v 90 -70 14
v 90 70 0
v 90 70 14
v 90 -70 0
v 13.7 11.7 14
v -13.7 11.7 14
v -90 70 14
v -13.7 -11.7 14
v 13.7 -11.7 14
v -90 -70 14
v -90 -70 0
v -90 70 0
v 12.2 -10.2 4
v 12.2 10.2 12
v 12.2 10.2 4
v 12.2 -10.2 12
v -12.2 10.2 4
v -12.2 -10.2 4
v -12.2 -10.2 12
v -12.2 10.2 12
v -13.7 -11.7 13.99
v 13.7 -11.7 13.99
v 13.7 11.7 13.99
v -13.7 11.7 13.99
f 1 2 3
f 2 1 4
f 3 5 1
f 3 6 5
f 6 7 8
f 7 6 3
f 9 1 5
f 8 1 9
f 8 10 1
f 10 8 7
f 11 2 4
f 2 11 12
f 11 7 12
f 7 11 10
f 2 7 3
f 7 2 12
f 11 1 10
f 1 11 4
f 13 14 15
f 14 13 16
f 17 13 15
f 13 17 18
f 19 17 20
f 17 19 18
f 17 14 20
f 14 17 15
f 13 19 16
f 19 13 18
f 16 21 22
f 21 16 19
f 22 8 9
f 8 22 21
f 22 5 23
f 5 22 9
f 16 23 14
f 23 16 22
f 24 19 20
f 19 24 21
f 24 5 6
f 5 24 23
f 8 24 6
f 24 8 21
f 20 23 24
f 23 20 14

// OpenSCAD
// Headphone stand: base, post, hanger. Units mm. Print orientation = export orientation (+Z up).
part = "base"; // [base, post, hanger, assembly]
cadverify_only = "";

/* Parameters */
base_L = 180; base_W = 140; base_H = 14;
base_sock_L = 24.4; base_sock_W = 20.4; base_sock_D = 10; // depth from top
base_floor = base_H - base_sock_D; // 4
base_cham_H = 2; base_cham_extra = 1.5; // per side funnel

post_low_L = 24; post_low_W = 20; post_low_H = 10;
post_shaft_L = 34; post_shaft_W = 28; post_shaft_H = 220;
post_up_L = 20; post_up_W = 16; post_up_H = 12;
post_up_cham_H = 1.5; post_up_cham_extra = 1.5; // per side taper at top
post_H = post_low_H + post_shaft_H + post_up_H; // 242

hanger_L = 120; hanger_W = 36; hanger_base_H = 14; hanger_R = 18; // half-cyl radius = W/2
hanger_cyl_H = 18; // peak 14+18=32
lip_L = 10; lip_W = 36; lip_bot = 24; lip_top = 36; // lips 24..36, protrude 4 above peak
hanger_H = 36;
hanger_sock_L = 20.4; hanger_sock_W = 16.4; hanger_sock_D = 12; // straight depth from bottom
hanger_roof_H = 10; // triangular roof above straight, ridge along X
hanger_cham_H = 2; hanger_cham_extra = 1.5;

asm_post_Z = base_floor; // 4, post bottom in assembly
asm_hanger_Z = 234; // hanger bottom in assembly (shaft top)
// checks: shaft top = asm_post_Z+post_low_H+post_shaft_H = 4+10+220=234 ok
// post top = 4+242=246 = hanger straight top (234+12) ok
// hanger top = 234+36=270 ok

module instance(name, part, unit = 1) {
    echo(cadverify_instance = [name, part, unit]);
    if (cadverify_only == "" || cadverify_only == name) children();
}

module base_part() {
    difference() {
        // plate
        translate([-base_L/2, -base_W/2, 0]) cube([base_L, base_W, base_H]);
        // straight socket
        translate([-base_sock_L/2, -base_sock_W/2, base_floor])
            cube([base_sock_L, base_sock_W, base_sock_D+0.01]);
        // entry funnel (frustum): bottom rect sock, top rect enlarged
        hull() {
            translate([-base_sock_L/2, -base_sock_W/2, base_H-base_cham_H])
                cube([base_sock_L, base_sock_W, 0.01]);
            translate([-(base_sock_L/2+base_cham_extra), -(base_sock_W/2+base_cham_extra), base_H-0.01])
                cube([base_sock_L+2*base_cham_extra, base_sock_W+2*base_cham_extra, 0.01]);
        }
    }
}

module post_part() {
    // lower tenon
    translate([-post_low_L/2, -post_low_W/2, 0]) cube([post_low_L, post_low_W, post_low_H]);
    // shaft
    translate([-post_shaft_L/2, -post_shaft_W/2, post_low_H])
        cube([post_shaft_L, post_shaft_W, post_shaft_H]);
    // upper tenon straight
    translate([-post_up_L/2, -post_up_W/2, post_low_H+post_shaft_H])
        cube([post_up_L, post_up_W, post_up_H-post_up_cham_H]);
    // upper tenon top chamfer frustum
    hull() {
        translate([-post_up_L/2, -post_up_W/2, post_low_H+post_shaft_H+post_up_H-post_up_cham_H-0.01])
            cube([post_up_L, post_up_W, 0.01]);
        translate([-(post_up_L/2-post_up_cham_extra), -(post_up_W/2-post_up_cham_extra), post_H-0.01])
            cube([post_up_L-2*post_up_cham_extra, post_up_W-2*post_up_cham_extra, 0.01]);
    }
}

module hanger_part() {
    difference() {
        union() {
            // base box
            translate([-hanger_L/2, -hanger_W/2, 0]) cube([hanger_L, hanger_W, hanger_base_H]);
            // top half-cylinder (only z>=base_H part)
            intersection() {
                translate([0, 0, hanger_base_H]) rotate([0, 90, 0])
                    cylinder(r=hanger_R, h=hanger_L, center=true, $fn=96);
                translate([-hanger_L/2, -hanger_W/2, hanger_base_H]) cube([hanger_L, hanger_W, hanger_cyl_H]);
            }
            // end lips
            for (sx=[-1,1])
                translate([sx*(hanger_L/2-lip_L), -lip_W/2, lip_bot])
                    cube([lip_L, lip_W, lip_top-lip_bot]);
        }
        // straight socket
        translate([-hanger_sock_L/2, -hanger_sock_W/2, 0])
            cube([hanger_sock_L, hanger_sock_W, hanger_sock_D]);
        // entry funnel at mouth (bottom)
        hull() {
            translate([-hanger_sock_L/2, -hanger_sock_W/2, hanger_cham_H])
                cube([hanger_sock_L, hanger_sock_W, 0.01]);
            translate([-(hanger_sock_L/2+hanger_cham_extra), -(hanger_sock_W/2+hanger_cham_extra), -0.01])
                cube([hanger_sock_L+2*hanger_cham_extra, hanger_sock_W+2*hanger_cham_extra, 0.01]);
        }
        // roof (triangular prism, ridge along X, apex up)
        // cross-section in YZ: base width sock_W at z=sock_D, apex at z=sock_D+roof_H, y=0
        hull() {
            // base edge left/right? Use two thin boxes to form prism via hull of apex line + base rect
            translate([-hanger_sock_L/2, -hanger_sock_W/2, hanger_sock_D-0.01])
                cube([hanger_sock_L, hanger_sock_W, 0.01]);
            translate([-hanger_sock_L/2, -0.01, hanger_sock_D+hanger_roof_H-0.01])
                cube([hanger_sock_L, 0.02, 0.01]);
        }
        // lip top chamfers (bevel top edges 1.5x1.5 at 45deg approx, upward facing only)
        // chamfer by cutting wedges? Instead skip - lips have flat tops, no cut needed.
    }
}

// --- specs (print coords) ---
if (part == "base") {
    echo(cadverify_spec = [
        ["bounds", [[-base_L/2, -base_W/2, 0], [base_L/2, base_W/2, base_H]]],
        ["bodies", 1],
        ["through_holes", 0],
        ["support_faces", [["base_bottom", "-z", 20000]]],
        ["overhangs_allowed", []],
        ["copies", 1],
        ["details", [
            ["base_plate", "material", [[50, 40, 0], [80, 60, base_H]], 0.9],
            ["socket", "void", [[-base_sock_L/2, -base_sock_W/2, base_floor], [base_sock_L/2, base_sock_W/2, base_H]], 0.9],
            ["socket_entry", "hole", [0, 0, base_H+6], [0, 0, -1], [[0, base_sock_W+2*base_cham_extra], [base_cham_H, base_sock_W], [base_sock_D, base_sock_W]]],
            ["floor", "thickness", [0, 0, -1], [0, 0, 1], base_floor],
            ["top_face", "view", [[-60, -50, base_H-1], [60, 50, base_H+1]]]
        ]]
    ]);
    base_part();
} else if (part == "post") {
    echo(cadverify_spec = [
        ["bounds", [[-post_shaft_L/2, -post_shaft_W/2, 0], [post_shaft_L/2, post_shaft_W/2, post_H]]],
        ["bodies", 1],
        ["through_holes", 0],
        ["support_faces", [["post_bottom", "-z", 400]]],
        ["overhangs_allowed", []],
        ["copies", 1],
        ["details", [
            ["shaft", "material", [[-10, -8, post_low_H+50], [10, 8, post_low_H+150]], 0.9],
            ["lower_tenon", "material", [[-post_low_L/2, -post_low_W/2, 0], [post_low_L/2, post_low_W/2, post_low_H]], 0.9],
            ["upper_tenon", "material", [[-post_up_L/2, -post_up_W/2, post_low_H+post_shaft_H], [post_up_L/2, post_up_W/2, post_H]], 0.9],
            ["shaft_wall", "thickness", [30, 0, post_low_H+100], [-1, 0, 0], post_shaft_L],
            ["tenon_tip", "view", [[-post_up_L/2, -post_up_W/2, post_H-4], [post_up_L/2, post_up_W/2, post_H+1]]]
        ]]
    ]);
    post_part();
} else if (part == "hanger") {
    echo(cadverify_spec = [
        ["bounds", [[-hanger_L/2, -hanger_W/2, 0], [hanger_L/2, hanger_W/2, hanger_H]]],
        ["bodies", 1],
        ["through_holes", 0],
        ["support_faces", [["hanger_bottom", "-z", 3000]]],
        ["overhangs_allowed", []],
        ["copies", 1],
        ["details", [
            ["saddle", "material", [[-40, -10, 10], [40, 10, 30]], 0.9],
            ["end_stop", "material", [[hanger_L/2-lip_L, -lip_W/2, lip_bot], [hanger_L/2, lip_W/2, lip_top]], 0.9],
            ["socket", "void", [[-hanger_sock_L/2, -hanger_sock_W/2, 0], [hanger_sock_L/2, hanger_sock_W/2, hanger_sock_D]], 0.9],
            ["socket_entry", "hole", [0, 0, -6], [0, 0, 1], [[0, hanger_sock_W+2*hanger_cham_extra], [hanger_cham_H, hanger_sock_W], [hanger_sock_D, hanger_sock_W]]],
            ["top_skin", "thickness", [0, 0, hanger_H+4], [0, 0, -1], hanger_H-(hanger_sock_D+hanger_roof_H)],
            ["round_top", "view", [[-40, -hanger_W/2, hanger_base_H], [40, hanger_W/2, hanger_base_H+hanger_cyl_H+1]]]
        ]]
    ]);
    hanger_part();
} else if (part == "assembly") {
    echo(cadverify_spec = [
        ["bounds", [[-base_L/2, -base_W/2, 0], [base_L/2, base_W/2, asm_hanger_Z+hanger_H]]],
        ["support_faces", [["desk", "-z", 20000]]],
        ["allowed_interferences", []],
        ["motions", []],
        ["assembly_order", [
            [[ "base_inst" ], [0, 0, 0]],
            [[ "post_inst" ], [0, 0, -1]],
            [[ "hanger_inst" ], [0, 0, -1]]
        ]],
        ["overhangs_allowed", []]
    ]);
    instance("base_inst", "base") base_part();
    instance("post_inst", "post") translate([0, 0, asm_post_Z]) post_part();
    instance("hanger_inst", "hanger") translate([0, 0, asm_hanger_Z]) hanger_part();
}
